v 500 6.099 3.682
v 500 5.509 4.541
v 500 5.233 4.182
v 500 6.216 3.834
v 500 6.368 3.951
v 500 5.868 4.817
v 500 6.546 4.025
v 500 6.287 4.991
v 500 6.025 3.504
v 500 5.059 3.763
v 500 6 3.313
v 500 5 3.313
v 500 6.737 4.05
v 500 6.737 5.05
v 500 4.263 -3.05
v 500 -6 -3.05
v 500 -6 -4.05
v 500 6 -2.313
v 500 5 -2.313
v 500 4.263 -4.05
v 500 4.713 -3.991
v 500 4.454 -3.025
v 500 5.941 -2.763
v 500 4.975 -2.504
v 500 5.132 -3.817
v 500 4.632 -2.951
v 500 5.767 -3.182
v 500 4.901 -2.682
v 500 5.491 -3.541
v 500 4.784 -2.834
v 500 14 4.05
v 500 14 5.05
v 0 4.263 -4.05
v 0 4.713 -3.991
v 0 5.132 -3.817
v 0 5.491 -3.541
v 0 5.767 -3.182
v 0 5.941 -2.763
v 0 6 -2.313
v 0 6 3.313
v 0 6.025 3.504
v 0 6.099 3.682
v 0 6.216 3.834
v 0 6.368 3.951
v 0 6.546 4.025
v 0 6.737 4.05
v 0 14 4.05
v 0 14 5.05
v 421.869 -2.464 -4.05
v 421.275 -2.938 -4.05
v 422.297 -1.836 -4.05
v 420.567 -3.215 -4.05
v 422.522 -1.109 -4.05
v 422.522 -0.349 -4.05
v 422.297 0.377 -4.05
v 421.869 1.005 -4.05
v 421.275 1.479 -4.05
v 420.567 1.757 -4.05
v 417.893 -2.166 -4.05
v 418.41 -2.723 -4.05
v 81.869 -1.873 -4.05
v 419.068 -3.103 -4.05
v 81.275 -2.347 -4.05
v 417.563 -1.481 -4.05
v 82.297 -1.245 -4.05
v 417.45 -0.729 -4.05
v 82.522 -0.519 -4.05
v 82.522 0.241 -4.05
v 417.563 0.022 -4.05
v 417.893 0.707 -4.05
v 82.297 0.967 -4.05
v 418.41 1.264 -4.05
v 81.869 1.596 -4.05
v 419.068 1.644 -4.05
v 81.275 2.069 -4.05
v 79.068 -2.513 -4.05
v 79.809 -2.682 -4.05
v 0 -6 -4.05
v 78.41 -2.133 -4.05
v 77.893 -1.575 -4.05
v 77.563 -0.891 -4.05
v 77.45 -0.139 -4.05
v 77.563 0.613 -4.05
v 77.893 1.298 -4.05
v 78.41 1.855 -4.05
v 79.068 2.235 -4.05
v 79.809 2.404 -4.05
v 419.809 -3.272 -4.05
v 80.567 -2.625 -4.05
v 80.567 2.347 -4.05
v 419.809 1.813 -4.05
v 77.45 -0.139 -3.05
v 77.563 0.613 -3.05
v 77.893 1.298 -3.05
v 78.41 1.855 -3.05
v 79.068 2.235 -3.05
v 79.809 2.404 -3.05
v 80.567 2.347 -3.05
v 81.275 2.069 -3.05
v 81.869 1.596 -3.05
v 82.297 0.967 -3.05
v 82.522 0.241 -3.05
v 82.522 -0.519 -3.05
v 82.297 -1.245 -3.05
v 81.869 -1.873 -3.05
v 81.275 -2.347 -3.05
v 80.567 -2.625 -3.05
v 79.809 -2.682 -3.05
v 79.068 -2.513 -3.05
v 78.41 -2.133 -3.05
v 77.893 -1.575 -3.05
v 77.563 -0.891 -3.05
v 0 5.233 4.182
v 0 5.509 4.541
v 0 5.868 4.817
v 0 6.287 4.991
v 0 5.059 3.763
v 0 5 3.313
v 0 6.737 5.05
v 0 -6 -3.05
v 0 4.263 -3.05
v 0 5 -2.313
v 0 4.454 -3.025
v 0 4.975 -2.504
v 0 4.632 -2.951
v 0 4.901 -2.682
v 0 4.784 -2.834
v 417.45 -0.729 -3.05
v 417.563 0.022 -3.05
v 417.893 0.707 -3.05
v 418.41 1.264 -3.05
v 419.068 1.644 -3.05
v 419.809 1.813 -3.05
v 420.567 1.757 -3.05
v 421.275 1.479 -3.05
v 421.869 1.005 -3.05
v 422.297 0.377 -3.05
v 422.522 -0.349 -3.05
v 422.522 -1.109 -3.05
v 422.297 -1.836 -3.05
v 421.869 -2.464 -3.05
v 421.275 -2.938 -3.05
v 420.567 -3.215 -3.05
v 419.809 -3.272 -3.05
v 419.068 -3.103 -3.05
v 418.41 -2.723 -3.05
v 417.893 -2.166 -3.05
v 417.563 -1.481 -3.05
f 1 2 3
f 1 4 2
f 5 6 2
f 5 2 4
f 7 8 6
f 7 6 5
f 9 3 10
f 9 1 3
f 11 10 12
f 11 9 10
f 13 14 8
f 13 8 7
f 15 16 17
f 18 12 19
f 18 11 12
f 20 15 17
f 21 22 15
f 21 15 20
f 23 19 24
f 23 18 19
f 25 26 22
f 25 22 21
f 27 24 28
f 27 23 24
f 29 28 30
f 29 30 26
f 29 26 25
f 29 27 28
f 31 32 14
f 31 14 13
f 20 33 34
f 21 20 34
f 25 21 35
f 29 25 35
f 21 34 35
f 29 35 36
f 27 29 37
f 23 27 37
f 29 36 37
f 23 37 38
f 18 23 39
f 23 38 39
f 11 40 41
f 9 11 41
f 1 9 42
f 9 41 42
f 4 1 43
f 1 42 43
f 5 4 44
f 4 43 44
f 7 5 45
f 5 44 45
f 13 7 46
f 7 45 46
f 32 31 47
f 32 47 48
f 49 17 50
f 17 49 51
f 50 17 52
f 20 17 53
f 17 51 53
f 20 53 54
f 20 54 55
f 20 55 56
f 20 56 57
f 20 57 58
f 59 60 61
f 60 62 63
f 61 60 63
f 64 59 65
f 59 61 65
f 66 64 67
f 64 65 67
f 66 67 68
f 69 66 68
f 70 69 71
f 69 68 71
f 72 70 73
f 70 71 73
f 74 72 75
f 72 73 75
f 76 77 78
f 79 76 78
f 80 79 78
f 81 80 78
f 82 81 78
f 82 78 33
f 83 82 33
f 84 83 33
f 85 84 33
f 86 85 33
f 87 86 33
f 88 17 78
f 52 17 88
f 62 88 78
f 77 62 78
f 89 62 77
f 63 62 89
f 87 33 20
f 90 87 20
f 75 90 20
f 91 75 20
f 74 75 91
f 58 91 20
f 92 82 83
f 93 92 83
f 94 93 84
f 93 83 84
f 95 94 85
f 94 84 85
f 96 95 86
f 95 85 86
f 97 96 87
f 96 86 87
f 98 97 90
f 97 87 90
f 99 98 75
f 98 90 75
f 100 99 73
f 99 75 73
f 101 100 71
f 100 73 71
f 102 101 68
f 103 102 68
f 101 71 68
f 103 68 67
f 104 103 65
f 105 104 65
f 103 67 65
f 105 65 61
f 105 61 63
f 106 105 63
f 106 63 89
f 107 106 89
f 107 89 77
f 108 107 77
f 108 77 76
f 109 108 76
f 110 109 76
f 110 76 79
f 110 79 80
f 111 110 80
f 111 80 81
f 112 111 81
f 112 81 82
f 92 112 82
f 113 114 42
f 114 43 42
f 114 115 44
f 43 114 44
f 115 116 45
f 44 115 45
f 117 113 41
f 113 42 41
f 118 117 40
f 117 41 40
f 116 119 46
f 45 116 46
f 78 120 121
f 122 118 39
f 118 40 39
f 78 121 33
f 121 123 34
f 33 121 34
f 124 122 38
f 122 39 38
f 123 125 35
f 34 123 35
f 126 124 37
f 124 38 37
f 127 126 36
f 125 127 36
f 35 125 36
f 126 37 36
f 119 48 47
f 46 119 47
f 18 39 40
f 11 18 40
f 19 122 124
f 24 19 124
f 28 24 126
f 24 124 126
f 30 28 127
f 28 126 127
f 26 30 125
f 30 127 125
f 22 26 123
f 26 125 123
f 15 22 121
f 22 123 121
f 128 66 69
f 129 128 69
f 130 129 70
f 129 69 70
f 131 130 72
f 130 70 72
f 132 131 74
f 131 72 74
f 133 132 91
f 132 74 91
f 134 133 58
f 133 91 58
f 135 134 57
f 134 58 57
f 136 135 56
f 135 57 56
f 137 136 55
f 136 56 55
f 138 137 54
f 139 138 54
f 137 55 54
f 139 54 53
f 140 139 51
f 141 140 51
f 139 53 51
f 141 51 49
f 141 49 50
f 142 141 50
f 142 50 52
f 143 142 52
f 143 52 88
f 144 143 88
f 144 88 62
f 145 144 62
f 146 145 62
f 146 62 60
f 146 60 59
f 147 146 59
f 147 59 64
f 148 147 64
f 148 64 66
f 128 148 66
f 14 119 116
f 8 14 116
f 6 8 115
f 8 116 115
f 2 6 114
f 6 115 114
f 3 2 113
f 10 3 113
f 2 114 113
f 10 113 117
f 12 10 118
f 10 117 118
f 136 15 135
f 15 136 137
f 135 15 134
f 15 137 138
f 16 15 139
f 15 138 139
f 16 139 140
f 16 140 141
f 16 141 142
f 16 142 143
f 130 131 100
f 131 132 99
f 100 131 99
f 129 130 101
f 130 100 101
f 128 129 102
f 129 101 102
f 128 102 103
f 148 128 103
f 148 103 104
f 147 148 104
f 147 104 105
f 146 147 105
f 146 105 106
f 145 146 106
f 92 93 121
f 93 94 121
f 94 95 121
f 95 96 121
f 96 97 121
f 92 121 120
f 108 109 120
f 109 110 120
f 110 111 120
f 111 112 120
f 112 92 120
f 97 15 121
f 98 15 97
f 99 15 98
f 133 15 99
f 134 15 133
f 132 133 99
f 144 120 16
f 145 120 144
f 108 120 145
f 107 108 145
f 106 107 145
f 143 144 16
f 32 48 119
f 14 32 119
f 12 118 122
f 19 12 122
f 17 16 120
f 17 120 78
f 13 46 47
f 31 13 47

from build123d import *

# Parameters (mm, degrees)
BASE_FLANGE1_DEPTH = 500
SKETCH4_R          = 2.55
CUT_EXTRUDE1_DEPTH = 501.278732308


# Sheet-metal steps are written as plain solids
with BuildPart() as part:
    # Sketch1 → Base-Flange1 (new body)
    with BuildSketch(Plane(origin=(0, 0, 0), x_dir=(0, 0, -1), z_dir=(1, 0, 0))):
        with BuildLine():
            Line((4.05, -6), (4.05, 4.2634))
            ThreePointArc((4.05, 4.2634), (3.541361636, 5.491361636), (2.3134, 6))
            Line((2.3134, 6), (-3.3134, 6))
            ThreePointArc((-3.3134, 6), (-3.834254855, 6.215745145), (-4.05, 6.7366))
            Line((-4.05, 6.7366), (-4.05, 14))
            Line((-4.05, 14), (-5.05, 14))
            Line((-5.05, 14), (-5.05, 6.7366))
            ThreePointArc((-5.05, 6.7366), (-4.541361636, 5.508638364), (-3.3134, 5))
            Line((-3.3134, 5), (2.3134, 5))
            ThreePointArc((2.3134, 5), (2.834254855, 4.784254855), (3.05, 4.2634))
            Line((3.05, 4.2634), (3.05, -6))
            Line((3.05, -6), (4.05, -6))
        make_face()
    extrude(amount=BASE_FLANGE1_DEPTH)

    # Sketch4 → Cut-Extrude1 (cut, through all)
    with BuildSketch(Plane(origin=(0, 0, -4.05), x_dir=(-1, 0, 0), z_dir=(0, 0, -1))):
        with Locations((-420, -0.729372)):
            Circle(SKETCH4_R)
        with Locations((-80, -0.138928)):
            Circle(SKETCH4_R)
    extrude(amount=-CUT_EXTRUDE1_DEPTH, mode=Mode.SUBTRACT)


solid = part.part
